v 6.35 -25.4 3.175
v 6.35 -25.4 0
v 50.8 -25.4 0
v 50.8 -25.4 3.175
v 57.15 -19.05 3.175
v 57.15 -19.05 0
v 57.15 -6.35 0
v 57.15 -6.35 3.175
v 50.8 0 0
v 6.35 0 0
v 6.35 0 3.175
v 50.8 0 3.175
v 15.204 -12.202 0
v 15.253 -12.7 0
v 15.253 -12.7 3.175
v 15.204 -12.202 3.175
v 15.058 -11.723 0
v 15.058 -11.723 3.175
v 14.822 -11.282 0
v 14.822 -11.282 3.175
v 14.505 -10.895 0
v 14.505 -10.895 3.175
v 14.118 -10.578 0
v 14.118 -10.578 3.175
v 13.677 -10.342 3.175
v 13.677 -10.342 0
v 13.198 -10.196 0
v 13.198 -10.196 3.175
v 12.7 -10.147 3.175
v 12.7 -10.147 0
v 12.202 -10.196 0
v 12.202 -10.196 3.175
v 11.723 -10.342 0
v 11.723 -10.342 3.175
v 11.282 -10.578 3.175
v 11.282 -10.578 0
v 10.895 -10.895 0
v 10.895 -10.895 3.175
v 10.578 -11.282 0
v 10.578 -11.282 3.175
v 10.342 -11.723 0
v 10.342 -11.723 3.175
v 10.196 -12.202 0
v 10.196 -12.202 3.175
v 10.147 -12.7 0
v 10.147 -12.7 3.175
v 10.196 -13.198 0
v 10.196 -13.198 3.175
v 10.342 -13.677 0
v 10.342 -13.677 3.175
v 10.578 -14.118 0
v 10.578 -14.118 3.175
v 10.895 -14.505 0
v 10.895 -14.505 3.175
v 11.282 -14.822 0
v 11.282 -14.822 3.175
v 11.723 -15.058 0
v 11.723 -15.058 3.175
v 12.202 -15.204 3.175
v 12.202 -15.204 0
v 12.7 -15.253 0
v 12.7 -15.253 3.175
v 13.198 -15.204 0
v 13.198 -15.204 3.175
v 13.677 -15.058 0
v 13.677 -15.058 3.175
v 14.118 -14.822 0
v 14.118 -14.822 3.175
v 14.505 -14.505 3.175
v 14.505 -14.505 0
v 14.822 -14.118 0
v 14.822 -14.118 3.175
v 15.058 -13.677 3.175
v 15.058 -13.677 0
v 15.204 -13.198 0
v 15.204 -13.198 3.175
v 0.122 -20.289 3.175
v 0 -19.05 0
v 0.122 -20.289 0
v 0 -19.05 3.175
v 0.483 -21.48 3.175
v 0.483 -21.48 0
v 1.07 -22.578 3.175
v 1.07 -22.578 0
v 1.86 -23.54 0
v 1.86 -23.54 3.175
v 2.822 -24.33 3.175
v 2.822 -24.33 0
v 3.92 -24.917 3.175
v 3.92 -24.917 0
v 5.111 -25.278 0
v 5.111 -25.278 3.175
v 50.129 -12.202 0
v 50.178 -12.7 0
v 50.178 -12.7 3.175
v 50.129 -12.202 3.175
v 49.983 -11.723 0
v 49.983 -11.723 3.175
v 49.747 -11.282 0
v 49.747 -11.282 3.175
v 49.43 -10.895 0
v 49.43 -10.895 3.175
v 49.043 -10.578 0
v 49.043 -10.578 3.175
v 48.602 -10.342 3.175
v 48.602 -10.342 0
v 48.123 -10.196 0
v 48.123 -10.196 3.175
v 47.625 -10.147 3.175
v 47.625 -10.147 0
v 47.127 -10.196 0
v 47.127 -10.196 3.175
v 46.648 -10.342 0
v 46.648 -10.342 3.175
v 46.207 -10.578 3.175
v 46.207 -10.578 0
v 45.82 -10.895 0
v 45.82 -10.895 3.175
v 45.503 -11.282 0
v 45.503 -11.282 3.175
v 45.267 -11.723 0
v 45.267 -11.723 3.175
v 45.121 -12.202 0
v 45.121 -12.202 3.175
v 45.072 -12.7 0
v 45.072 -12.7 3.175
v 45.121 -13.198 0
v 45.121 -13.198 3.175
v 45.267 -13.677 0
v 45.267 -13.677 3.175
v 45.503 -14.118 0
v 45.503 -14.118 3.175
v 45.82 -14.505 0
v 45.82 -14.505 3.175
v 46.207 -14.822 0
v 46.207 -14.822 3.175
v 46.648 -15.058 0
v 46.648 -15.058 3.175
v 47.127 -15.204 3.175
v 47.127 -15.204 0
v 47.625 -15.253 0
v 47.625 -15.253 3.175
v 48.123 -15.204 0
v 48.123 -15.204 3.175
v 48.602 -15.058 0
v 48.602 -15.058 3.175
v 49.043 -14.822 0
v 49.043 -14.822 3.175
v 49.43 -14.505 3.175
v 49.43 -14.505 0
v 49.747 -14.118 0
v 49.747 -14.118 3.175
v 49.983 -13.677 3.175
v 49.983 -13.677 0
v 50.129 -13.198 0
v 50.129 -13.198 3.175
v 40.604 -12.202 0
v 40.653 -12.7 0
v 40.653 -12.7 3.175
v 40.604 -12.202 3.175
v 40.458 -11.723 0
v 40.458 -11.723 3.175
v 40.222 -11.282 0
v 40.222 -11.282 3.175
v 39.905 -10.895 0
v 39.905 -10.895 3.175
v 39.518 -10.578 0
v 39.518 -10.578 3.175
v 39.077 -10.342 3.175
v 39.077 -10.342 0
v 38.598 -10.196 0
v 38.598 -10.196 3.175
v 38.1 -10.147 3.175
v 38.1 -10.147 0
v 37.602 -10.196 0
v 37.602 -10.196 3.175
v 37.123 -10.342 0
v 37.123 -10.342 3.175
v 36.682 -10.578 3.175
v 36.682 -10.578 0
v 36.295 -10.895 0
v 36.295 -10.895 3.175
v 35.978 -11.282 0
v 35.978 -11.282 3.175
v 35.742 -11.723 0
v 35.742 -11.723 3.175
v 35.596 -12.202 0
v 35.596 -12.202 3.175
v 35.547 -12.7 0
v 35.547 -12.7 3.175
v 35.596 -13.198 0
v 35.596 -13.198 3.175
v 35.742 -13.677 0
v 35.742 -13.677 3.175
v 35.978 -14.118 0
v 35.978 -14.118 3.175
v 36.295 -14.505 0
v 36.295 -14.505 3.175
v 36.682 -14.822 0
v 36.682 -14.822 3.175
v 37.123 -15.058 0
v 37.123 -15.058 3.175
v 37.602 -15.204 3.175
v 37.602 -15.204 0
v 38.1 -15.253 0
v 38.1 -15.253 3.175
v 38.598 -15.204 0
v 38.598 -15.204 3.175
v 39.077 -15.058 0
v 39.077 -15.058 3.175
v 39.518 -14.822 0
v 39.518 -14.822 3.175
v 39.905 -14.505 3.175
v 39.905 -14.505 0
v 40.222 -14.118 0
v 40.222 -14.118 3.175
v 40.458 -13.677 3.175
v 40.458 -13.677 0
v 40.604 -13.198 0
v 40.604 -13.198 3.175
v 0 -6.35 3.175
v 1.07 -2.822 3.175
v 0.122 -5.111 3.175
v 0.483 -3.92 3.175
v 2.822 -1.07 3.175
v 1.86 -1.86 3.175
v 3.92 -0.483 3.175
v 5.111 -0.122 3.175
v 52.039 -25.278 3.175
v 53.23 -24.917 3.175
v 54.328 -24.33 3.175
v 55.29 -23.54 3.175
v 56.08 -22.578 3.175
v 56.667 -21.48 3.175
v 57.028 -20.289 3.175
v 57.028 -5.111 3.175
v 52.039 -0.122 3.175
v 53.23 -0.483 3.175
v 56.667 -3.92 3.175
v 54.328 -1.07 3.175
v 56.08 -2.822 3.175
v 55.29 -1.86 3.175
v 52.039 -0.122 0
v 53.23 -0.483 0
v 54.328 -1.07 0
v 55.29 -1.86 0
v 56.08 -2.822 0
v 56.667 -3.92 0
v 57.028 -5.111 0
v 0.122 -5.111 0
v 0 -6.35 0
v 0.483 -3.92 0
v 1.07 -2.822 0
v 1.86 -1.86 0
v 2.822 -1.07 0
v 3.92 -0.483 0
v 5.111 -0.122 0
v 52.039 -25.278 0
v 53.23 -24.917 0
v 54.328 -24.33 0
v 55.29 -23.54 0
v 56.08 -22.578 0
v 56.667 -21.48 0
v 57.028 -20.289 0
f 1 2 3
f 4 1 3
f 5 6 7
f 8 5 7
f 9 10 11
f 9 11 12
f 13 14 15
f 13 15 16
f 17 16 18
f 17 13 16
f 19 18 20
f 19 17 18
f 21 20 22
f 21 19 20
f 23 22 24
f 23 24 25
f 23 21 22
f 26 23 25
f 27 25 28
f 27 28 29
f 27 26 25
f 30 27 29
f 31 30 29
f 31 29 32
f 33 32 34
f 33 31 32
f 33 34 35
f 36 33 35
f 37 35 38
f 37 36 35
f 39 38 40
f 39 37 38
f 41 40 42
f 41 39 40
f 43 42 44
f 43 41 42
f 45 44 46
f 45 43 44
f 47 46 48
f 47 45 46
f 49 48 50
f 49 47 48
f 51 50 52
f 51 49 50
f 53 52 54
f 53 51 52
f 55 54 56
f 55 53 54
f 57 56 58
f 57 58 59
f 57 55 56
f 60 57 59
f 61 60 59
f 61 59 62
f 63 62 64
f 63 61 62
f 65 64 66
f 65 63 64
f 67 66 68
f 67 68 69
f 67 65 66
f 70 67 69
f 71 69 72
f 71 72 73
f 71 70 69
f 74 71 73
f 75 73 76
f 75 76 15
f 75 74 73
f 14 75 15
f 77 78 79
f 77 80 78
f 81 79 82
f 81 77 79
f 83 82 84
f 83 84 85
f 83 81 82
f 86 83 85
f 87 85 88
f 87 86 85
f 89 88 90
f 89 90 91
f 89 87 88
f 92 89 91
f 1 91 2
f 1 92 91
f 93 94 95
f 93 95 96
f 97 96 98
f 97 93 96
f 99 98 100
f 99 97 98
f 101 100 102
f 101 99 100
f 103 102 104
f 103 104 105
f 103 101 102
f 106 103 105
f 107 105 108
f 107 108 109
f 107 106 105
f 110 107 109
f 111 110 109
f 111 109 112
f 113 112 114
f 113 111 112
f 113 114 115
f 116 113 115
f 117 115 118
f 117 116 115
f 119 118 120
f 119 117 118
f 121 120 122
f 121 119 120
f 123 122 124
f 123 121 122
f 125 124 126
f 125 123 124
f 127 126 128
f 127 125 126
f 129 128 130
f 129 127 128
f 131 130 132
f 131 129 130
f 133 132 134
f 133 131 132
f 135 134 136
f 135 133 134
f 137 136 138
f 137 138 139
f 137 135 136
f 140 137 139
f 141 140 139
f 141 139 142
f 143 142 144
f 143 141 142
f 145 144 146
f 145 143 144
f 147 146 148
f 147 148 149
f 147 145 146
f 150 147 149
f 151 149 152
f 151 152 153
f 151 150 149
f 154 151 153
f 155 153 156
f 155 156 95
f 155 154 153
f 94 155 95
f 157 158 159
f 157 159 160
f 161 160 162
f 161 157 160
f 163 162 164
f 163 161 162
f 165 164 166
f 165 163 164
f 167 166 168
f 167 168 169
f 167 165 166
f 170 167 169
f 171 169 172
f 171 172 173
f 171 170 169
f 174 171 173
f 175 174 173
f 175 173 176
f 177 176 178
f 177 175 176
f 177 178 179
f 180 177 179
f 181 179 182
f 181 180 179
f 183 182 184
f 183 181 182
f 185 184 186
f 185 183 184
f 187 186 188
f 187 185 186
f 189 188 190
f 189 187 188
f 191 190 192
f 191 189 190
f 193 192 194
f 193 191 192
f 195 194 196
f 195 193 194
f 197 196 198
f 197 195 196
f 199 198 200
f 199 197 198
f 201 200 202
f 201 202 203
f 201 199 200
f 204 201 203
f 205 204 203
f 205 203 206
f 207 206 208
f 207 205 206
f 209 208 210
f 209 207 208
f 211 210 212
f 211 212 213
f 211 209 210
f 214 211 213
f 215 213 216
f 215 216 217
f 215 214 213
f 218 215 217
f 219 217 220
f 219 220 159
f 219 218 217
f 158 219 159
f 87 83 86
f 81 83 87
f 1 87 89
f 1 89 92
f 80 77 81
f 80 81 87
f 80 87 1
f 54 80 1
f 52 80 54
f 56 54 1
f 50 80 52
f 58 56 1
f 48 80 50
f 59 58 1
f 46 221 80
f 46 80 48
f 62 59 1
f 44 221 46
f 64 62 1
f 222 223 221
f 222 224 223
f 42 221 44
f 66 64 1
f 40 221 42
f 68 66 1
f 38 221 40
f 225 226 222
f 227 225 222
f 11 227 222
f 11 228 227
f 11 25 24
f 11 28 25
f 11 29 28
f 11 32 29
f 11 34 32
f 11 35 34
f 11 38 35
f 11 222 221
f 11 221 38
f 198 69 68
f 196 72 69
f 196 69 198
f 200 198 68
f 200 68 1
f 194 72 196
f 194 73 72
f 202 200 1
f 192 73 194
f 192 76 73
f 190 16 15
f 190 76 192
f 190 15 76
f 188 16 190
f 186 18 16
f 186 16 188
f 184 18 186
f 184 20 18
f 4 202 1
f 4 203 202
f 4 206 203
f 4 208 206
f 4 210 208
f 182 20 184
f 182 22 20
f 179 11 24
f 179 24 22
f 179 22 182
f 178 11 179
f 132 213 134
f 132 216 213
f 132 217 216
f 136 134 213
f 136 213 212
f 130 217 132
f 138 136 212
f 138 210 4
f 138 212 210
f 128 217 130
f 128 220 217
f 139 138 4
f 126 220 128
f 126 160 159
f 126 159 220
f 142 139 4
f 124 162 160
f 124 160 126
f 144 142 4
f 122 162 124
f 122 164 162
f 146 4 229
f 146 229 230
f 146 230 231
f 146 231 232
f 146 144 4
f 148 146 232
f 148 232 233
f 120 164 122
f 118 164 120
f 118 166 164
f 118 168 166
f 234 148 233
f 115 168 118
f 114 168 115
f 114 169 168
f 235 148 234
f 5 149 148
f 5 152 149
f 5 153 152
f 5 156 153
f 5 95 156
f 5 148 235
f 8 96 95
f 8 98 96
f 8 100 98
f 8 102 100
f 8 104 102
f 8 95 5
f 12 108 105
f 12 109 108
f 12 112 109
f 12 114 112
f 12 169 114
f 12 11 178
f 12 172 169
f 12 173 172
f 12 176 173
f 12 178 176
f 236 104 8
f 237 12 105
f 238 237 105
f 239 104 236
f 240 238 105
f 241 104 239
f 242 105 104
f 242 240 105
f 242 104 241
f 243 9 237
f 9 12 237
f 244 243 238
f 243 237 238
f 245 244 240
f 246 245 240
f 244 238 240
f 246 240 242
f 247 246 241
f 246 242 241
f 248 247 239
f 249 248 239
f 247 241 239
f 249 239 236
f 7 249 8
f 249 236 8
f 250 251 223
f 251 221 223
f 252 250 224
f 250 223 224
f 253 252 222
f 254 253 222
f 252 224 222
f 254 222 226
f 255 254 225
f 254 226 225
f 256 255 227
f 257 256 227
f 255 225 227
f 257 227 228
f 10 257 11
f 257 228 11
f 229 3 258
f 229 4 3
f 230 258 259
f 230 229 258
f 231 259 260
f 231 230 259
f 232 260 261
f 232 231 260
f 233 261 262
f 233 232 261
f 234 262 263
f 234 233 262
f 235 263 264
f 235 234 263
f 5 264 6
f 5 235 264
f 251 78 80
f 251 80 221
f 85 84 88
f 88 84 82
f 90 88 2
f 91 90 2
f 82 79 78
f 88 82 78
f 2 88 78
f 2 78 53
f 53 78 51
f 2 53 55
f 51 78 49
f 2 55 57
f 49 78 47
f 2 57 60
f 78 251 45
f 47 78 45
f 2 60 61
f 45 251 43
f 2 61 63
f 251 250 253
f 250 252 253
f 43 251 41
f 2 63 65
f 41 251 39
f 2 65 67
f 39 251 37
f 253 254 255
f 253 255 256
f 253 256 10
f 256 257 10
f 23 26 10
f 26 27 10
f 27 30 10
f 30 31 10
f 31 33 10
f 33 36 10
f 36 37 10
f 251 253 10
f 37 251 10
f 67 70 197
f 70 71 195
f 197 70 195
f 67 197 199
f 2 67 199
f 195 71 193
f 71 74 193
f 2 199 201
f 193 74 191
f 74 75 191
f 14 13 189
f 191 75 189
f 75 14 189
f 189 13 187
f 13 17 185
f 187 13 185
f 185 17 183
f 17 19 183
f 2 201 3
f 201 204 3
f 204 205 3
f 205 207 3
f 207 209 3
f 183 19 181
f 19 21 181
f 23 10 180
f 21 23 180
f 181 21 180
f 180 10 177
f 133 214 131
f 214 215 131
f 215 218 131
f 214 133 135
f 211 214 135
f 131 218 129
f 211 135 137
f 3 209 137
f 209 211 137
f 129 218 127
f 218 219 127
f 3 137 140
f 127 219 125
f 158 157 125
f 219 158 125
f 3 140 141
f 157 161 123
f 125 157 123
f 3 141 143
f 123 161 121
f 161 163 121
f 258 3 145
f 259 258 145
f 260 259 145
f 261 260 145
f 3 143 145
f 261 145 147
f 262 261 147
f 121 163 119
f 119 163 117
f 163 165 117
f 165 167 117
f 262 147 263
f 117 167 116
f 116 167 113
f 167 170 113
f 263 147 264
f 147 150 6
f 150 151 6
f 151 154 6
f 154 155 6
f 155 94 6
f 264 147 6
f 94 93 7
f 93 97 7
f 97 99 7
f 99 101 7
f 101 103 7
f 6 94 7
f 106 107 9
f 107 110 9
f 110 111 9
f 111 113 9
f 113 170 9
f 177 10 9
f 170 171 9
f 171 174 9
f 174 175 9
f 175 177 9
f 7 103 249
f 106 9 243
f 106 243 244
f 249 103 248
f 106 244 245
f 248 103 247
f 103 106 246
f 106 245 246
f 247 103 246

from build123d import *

# Parameters (mm, degrees)
SKETCH1_W           = 57.15
SKETCH1_H           = 25.4
SKETCH1_R           = 2.5527
BOSS_EXTRUDE1_DEPTH = 3.175
FILLET1_R           = 6.35


with BuildPart() as part:
    # Sketch1 → Boss-Extrude1 (new body)
    with BuildSketch(Plane.XY):
        with Locations((28.575, -12.7)):
            Rectangle(SKETCH1_W, SKETCH1_H)
        with Locations((12.7, -12.7)):
            Circle(SKETCH1_R, mode=Mode.SUBTRACT)
        with Locations((38.1, -12.7)):
            Circle(SKETCH1_R, mode=Mode.SUBTRACT)
        with Locations((47.625, -12.7)):
            Circle(SKETCH1_R, mode=Mode.SUBTRACT)
    extrude(amount=BOSS_EXTRUDE1_DEPTH)

    # Fillet1
    fillet1_edges = [part.edges().sort_by_distance(p)[0] for p in [
        (0, 0, 1.5875),
        (57.15, 0, 1.5875),
        (57.15, -25.4, 1.5875),
        (0, -25.4, 1.5875),
    ]]
    fillet(fillet1_edges, radius=FILLET1_R)


solid = part.part
